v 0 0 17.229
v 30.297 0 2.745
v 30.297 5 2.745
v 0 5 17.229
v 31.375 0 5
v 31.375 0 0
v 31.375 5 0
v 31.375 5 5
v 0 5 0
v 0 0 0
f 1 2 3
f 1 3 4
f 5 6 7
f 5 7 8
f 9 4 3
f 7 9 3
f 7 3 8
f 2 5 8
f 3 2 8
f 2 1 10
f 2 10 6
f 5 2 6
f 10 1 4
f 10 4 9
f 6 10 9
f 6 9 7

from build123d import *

# Parameters (mm, degrees)
F1_DEPTH = 5
F2_DEPTH = 2.5


with BuildPart() as f1:
    # F0 (on Front) → F1 (new body)
    with BuildSketch(Plane.XZ):
        Polygon((0, 20), (0, 0), (31.3749988316, 0), (31.3749988316, 5), align=None)
    extrude(amount=-F1_DEPTH)

    # F2 (cut): a face of the model
    f2_faces = [f1.faces().sort_by_distance(p)[0] for p in [
        (15.6874994158, 2.5, 12.5),
    ]]
    extrude(f2_faces, amount=-F2_DEPTH, mode=Mode.SUBTRACT)


solid = f1.part
